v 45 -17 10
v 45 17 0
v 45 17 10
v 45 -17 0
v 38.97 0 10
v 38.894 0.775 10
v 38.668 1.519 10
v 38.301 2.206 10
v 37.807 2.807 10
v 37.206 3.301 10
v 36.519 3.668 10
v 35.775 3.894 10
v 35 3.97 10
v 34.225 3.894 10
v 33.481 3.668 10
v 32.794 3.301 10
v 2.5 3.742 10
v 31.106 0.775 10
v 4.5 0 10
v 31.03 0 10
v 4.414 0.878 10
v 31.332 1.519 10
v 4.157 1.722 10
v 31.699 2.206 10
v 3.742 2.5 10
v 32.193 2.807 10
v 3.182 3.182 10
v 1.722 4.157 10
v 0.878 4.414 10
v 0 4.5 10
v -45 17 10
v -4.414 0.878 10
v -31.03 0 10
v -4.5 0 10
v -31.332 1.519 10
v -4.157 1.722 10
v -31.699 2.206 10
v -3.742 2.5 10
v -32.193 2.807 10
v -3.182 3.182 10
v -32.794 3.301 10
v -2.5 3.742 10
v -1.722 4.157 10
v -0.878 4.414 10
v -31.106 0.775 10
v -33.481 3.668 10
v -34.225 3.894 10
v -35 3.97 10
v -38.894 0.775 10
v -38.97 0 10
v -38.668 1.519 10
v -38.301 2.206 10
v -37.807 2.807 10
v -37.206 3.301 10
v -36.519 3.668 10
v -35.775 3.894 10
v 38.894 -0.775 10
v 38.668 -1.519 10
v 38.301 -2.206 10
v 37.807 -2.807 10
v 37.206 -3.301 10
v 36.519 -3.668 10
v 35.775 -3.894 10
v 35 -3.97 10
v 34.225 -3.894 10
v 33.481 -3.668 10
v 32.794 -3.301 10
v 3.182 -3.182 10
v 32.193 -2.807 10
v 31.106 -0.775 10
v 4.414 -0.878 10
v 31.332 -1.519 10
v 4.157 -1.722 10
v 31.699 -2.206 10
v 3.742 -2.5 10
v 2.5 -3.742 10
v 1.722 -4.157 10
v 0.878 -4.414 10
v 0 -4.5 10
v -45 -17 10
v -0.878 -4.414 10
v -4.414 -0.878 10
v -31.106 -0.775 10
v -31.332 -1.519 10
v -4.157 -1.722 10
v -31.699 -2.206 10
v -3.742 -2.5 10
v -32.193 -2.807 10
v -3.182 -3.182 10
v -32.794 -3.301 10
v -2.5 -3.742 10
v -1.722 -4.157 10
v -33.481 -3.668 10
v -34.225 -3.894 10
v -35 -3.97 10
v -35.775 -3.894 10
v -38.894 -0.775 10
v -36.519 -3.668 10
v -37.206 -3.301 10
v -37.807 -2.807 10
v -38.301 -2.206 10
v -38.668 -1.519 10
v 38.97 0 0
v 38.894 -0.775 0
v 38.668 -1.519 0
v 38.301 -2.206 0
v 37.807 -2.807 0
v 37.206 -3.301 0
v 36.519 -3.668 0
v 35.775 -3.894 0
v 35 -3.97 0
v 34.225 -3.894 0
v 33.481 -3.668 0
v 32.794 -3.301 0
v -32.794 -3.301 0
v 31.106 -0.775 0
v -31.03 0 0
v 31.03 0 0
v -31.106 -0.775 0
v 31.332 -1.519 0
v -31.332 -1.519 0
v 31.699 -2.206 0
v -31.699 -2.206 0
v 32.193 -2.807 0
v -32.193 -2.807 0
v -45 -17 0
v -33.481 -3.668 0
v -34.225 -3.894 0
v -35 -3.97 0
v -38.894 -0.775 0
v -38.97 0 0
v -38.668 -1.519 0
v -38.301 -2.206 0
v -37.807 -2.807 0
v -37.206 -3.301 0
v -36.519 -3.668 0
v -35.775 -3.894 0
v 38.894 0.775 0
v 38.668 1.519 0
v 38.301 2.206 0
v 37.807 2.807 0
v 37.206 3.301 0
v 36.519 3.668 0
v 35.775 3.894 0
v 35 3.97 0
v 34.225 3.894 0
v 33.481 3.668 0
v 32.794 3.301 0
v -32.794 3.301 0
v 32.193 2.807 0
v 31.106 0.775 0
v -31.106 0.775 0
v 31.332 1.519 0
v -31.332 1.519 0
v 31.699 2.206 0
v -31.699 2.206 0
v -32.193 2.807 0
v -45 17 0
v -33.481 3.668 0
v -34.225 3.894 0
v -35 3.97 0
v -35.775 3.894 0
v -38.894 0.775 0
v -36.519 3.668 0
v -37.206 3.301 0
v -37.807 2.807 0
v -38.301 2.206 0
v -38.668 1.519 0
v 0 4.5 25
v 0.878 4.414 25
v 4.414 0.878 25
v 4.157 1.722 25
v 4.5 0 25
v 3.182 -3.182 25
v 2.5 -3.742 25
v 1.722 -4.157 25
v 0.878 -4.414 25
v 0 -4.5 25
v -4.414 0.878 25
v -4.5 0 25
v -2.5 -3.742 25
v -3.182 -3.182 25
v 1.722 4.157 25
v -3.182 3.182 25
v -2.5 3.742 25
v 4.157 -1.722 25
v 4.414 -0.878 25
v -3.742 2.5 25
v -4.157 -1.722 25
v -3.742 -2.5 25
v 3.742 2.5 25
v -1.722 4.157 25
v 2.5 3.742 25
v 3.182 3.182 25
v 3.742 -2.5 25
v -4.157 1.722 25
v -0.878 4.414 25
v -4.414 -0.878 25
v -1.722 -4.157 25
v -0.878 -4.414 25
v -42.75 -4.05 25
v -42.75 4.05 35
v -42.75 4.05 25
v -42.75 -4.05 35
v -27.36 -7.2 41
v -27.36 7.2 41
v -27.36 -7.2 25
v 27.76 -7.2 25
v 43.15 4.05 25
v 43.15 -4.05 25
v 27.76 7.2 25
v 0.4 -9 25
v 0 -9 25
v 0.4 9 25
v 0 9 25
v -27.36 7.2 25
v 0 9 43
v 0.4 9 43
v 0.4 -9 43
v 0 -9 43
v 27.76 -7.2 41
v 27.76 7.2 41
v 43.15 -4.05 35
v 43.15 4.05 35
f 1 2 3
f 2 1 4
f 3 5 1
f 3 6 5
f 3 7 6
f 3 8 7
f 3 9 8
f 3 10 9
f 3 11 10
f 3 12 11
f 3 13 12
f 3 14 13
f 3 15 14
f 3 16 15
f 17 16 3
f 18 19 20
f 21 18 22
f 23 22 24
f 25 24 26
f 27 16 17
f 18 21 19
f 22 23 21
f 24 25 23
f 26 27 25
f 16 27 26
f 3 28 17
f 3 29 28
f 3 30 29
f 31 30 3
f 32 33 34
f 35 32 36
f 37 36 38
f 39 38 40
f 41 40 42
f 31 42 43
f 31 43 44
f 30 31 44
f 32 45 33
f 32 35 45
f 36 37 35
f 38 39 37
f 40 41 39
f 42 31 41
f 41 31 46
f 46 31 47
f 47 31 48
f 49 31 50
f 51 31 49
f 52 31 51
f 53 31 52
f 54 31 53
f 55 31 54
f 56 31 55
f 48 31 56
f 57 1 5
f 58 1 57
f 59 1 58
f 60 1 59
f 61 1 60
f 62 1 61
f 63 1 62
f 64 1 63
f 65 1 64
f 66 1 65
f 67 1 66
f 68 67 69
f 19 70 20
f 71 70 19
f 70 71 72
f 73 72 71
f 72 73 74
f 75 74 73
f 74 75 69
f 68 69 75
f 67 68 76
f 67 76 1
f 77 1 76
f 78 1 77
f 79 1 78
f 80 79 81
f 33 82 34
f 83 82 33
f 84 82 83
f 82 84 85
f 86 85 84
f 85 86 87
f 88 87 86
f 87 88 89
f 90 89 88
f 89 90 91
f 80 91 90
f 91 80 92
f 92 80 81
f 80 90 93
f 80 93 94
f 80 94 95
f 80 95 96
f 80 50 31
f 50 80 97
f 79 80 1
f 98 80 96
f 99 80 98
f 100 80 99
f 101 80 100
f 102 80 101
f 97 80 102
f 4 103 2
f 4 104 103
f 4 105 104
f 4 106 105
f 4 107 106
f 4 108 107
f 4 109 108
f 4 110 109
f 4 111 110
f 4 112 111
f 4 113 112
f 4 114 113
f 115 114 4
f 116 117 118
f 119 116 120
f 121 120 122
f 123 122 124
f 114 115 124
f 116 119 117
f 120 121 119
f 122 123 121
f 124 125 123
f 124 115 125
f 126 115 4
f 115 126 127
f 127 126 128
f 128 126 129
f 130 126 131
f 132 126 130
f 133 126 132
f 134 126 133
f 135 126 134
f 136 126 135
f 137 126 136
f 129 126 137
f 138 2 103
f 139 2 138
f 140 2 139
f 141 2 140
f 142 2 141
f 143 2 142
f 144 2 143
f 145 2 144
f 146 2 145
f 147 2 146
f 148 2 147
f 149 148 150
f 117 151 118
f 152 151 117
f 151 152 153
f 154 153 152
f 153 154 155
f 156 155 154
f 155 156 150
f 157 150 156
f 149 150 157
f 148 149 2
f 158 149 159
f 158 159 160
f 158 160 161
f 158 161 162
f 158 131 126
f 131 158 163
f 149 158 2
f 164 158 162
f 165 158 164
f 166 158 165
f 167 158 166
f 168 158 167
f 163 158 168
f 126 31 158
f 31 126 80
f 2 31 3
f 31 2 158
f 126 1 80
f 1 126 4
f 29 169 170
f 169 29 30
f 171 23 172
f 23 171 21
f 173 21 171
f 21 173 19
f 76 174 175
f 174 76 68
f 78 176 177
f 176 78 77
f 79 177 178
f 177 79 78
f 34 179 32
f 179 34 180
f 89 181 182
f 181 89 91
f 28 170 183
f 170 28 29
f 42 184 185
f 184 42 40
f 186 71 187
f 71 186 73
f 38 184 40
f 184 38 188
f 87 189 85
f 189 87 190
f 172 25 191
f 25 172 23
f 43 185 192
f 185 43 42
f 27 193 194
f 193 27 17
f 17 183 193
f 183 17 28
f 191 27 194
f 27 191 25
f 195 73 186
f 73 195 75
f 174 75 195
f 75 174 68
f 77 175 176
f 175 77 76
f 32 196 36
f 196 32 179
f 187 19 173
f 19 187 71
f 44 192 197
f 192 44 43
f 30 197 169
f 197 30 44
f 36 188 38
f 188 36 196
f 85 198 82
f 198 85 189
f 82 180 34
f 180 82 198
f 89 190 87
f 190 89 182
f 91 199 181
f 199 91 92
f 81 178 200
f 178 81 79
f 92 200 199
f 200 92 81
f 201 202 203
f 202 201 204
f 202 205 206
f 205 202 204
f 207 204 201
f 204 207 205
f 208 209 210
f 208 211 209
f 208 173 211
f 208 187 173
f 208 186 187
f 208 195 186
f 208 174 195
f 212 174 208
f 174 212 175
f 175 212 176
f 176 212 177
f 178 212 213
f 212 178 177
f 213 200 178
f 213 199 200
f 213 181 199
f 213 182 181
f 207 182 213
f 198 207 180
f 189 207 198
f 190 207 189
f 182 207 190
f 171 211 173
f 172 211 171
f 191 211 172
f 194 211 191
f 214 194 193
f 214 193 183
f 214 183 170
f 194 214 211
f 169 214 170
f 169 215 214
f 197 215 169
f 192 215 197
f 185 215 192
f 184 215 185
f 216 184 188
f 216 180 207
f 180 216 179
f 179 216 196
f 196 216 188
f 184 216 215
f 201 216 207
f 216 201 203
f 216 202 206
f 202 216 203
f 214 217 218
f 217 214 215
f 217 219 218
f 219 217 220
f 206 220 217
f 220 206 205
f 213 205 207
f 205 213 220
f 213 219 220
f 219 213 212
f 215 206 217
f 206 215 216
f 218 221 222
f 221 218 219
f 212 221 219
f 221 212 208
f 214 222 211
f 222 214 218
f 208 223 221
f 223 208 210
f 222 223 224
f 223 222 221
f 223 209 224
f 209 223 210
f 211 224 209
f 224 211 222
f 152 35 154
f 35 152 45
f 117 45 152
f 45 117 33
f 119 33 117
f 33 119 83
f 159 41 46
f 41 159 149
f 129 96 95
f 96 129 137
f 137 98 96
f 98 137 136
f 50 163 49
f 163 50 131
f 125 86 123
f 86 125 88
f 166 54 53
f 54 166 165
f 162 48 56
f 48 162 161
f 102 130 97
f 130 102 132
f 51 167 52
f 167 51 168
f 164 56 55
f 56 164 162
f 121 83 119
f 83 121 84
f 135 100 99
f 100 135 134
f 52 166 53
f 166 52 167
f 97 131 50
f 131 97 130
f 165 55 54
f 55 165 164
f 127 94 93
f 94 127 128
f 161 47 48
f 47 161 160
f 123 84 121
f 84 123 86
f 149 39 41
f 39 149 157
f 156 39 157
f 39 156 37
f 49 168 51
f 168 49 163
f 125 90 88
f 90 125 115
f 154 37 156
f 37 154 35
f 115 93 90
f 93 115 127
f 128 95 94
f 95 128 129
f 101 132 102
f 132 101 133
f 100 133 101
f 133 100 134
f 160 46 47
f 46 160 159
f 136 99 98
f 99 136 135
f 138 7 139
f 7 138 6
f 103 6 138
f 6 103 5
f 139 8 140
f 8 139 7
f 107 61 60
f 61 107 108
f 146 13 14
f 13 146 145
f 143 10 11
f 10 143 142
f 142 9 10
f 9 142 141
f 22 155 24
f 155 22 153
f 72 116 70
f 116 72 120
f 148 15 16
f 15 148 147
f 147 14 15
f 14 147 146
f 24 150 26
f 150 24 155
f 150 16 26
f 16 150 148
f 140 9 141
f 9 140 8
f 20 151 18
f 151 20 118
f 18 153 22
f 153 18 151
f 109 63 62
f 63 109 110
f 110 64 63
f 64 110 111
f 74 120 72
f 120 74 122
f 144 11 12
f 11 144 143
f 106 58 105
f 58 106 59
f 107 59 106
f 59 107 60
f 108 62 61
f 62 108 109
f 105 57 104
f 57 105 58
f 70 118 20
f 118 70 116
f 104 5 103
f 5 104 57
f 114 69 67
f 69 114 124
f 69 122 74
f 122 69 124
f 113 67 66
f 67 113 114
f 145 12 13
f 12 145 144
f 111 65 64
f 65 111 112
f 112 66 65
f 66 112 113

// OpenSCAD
$fn = 32;

// ----------------------------------------------------------------------
// Boat cleat: 90 mm base, horn 34 mm up
// ----------------------------------------------------------------------

// --- parameters (mm) ---
base_l = 90;              // base length
base_w = 34;              // base width
base_t = 10;              // base thickness
horn_len = 85.5;          // horn length
horn_d = 18;              // horn diameter at the middle
horn_z = 34;              // horn axis height
end_drop = 8;             // how far the horn tips drop
post_d = 9;               // centre post diameter
holes_d = 7.94;           // fixing holes
hole_x = 35;              // fixing hole spacing

difference() {
  union() {
    translate([-45, -17, 0]) cube([base_l, base_w, base_t]);
    /* centre post, sunk 1 mm into the base */
    translate([0, 0, 9]) cylinder(h = 25, d = post_d);
    /* horn: a hull chain of boxes, full in the middle and lighter at the tips */
    hull() {
      translate([-42.75, -4.05, 25]) cube([0.4, 8.1, 10], center = false);
      translate([-27.36, -7.2, 25]) cube([0.4, 14.4, 16], center = false);
    }
    hull() {
      translate([-27.36, -7.2, 25]) cube([0.4, 14.4, 16], center = false);
      translate([0, -9, 25]) cube([0.4, 18, 18], center = false);
    }
    hull() {
      translate([0, -9, 25]) cube([0.4, 18, 18], center = false);
      translate([27.36, -7.2, 25]) cube([0.4, 14.4, 16], center = false);
    }
    hull() {
      translate([27.36, -7.2, 25]) cube([0.4, 14.4, 16], center = false);
      translate([42.75, -4.05, 25]) cube([0.4, 8.1, 10], center = false);
    }
  }
  translate([-35, 0, -2.5]) cylinder(h = base_t + 5, d = holes_d);
  translate([35, 0, -2.5]) cylinder(h = base_t + 5, d = holes_d);
}
